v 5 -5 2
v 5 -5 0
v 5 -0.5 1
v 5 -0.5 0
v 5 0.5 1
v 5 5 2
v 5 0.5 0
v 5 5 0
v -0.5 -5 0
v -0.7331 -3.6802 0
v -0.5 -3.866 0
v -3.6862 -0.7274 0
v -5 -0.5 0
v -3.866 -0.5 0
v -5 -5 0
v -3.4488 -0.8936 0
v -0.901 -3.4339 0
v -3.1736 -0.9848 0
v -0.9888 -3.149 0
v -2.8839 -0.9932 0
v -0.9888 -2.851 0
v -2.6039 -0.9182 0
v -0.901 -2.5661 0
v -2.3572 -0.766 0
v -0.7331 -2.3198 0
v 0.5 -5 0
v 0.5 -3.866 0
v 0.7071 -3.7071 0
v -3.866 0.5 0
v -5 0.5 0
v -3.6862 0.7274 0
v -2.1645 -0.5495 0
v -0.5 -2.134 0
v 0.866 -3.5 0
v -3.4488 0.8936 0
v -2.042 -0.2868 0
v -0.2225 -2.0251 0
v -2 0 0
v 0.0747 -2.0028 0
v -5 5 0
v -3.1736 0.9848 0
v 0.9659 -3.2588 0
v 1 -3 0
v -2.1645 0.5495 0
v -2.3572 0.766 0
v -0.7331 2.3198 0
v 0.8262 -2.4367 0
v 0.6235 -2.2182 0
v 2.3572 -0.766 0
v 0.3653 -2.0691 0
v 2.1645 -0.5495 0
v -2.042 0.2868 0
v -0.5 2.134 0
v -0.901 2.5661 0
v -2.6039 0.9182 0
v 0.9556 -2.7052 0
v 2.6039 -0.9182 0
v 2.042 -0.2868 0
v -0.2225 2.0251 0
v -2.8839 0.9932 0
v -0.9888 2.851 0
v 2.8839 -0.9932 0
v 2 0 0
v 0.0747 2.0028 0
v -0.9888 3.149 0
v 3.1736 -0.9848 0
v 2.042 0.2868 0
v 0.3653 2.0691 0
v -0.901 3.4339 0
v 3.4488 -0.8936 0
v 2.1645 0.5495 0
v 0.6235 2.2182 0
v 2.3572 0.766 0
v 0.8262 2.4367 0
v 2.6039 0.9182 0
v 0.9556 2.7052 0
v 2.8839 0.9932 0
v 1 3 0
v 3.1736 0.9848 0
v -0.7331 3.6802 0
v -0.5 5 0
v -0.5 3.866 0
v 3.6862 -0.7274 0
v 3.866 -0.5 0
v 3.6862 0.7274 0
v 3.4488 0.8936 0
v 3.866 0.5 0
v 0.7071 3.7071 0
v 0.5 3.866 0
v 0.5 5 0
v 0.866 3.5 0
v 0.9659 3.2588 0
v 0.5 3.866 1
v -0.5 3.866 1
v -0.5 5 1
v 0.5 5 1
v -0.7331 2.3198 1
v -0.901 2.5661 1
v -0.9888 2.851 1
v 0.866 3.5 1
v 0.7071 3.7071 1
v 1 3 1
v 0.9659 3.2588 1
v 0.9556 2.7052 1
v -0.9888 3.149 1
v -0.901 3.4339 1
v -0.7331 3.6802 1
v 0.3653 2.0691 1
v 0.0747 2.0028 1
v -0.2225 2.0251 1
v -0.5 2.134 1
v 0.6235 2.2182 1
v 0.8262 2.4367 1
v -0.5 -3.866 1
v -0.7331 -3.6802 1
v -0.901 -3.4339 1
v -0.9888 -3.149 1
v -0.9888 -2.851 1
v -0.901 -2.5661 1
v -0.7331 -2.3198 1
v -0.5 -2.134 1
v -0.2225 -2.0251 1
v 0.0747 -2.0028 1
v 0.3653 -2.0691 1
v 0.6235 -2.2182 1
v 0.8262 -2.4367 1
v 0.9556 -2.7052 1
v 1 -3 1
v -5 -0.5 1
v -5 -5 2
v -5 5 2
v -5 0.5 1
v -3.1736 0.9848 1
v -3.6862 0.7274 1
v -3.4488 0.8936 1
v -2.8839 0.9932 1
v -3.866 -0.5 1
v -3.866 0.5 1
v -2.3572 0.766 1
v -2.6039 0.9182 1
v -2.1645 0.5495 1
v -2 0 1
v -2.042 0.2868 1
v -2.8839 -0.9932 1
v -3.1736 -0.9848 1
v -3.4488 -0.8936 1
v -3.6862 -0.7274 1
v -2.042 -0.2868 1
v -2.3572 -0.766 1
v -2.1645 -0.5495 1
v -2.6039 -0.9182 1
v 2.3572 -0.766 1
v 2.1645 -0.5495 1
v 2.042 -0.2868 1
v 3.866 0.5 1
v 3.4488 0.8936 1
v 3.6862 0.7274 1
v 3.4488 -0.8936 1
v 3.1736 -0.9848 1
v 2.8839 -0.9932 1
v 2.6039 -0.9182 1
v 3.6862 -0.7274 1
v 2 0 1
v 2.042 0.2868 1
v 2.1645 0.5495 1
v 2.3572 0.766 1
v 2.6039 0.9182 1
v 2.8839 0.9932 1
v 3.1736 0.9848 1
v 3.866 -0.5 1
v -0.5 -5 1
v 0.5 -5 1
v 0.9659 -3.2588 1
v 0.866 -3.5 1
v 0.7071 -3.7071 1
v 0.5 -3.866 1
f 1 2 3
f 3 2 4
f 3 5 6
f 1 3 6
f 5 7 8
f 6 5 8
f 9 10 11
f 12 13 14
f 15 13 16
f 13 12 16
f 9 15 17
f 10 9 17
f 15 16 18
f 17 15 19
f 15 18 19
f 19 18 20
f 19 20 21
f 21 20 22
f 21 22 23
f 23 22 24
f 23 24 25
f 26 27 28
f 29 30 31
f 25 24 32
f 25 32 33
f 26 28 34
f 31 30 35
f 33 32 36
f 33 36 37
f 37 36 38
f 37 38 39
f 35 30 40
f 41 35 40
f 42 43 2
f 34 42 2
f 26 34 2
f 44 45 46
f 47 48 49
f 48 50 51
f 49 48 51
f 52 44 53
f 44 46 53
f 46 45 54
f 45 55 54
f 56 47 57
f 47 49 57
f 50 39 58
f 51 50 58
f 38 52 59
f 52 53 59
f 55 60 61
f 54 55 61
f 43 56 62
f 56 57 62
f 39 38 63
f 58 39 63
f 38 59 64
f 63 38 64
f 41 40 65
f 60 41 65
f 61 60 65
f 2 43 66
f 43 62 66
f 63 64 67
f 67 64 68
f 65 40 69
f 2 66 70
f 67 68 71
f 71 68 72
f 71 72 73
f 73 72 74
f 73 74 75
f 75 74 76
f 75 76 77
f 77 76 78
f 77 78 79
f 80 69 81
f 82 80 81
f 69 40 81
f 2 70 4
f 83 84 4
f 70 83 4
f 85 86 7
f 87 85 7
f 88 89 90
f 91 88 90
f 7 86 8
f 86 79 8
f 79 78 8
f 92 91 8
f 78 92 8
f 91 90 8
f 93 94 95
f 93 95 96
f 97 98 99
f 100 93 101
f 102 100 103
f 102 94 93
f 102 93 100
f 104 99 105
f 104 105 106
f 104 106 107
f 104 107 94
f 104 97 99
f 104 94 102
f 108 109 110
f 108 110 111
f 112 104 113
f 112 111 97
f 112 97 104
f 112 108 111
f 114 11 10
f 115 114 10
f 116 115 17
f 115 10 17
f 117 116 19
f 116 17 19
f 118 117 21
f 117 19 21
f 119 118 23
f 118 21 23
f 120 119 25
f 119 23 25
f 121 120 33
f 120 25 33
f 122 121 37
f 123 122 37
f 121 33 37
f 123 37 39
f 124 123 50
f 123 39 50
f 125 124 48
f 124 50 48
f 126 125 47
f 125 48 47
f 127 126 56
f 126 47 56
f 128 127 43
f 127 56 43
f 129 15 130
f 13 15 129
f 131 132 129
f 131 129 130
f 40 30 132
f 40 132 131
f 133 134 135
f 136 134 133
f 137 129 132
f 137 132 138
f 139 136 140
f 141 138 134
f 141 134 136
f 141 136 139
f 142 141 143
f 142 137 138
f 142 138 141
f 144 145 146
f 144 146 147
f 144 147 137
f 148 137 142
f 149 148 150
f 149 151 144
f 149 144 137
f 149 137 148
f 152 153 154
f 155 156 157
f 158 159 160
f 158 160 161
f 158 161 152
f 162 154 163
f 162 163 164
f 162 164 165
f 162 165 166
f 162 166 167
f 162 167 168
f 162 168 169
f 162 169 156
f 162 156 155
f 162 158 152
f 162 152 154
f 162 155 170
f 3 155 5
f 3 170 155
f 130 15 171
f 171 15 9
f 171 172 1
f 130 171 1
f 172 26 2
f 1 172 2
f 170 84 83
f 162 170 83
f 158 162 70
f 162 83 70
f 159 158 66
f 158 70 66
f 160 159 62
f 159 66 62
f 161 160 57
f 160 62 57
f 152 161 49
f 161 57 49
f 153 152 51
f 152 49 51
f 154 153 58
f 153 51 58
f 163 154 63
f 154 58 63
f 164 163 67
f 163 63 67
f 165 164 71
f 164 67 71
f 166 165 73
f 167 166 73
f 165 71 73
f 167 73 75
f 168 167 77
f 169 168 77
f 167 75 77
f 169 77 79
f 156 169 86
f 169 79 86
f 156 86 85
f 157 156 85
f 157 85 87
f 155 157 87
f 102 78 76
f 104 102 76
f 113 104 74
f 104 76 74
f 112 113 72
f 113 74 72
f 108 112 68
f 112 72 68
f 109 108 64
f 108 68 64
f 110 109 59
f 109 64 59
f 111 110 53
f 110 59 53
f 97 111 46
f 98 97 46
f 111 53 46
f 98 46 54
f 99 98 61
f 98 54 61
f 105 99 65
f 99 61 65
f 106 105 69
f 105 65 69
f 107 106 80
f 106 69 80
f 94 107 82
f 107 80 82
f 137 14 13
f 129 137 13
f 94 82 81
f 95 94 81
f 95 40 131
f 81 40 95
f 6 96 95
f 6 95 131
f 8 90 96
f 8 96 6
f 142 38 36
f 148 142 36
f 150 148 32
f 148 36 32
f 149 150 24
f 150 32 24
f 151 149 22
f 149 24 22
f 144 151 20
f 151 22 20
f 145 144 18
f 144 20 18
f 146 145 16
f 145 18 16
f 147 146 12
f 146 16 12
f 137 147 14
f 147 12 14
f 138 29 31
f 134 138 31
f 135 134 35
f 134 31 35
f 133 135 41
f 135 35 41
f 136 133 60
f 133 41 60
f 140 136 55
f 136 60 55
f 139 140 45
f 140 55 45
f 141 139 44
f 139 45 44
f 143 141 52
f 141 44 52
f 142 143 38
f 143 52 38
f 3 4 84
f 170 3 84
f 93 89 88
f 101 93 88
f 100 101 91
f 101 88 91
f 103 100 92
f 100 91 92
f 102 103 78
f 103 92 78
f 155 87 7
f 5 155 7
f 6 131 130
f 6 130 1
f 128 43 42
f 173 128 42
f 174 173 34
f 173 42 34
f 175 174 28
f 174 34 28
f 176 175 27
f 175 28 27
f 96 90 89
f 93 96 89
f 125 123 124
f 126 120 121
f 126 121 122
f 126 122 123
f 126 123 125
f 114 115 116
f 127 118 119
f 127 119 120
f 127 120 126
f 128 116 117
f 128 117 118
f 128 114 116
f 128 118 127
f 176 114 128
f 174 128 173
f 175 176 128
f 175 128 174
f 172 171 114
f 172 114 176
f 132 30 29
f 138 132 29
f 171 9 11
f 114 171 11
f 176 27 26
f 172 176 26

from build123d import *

# Parameters (mm, degrees)
F0_W     = 10
F0_H     = 10
F1_DEPTH = 2
F3_DEPTH = 1


with BuildPart() as f1:
    # F0 (on Top) → F1 (new body)
    with BuildSketch(Plane.XY):
        Rectangle(F0_W, F0_H)
    extrude(amount=F1_DEPTH)

    # F2 (on face) → F3 (cut)
    with BuildSketch(Plane(origin=(0, 0, 0), x_dir=(1, 0, 0), z_dir=(0, 0, -1))):
        with BuildLine():
            ThreePointArc((-0.5, 3.8660254038), (-0.5, 2.1339745962), (1, 3))
            ThreePointArc((1, 3), (0.8660254038, 3.5), (0.5, 3.8660254038))
            Line((0.5, 3.8660254038), (0.5, 3))
            Line((0.5, 3), (-0.5, 3))
            Line((-0.5, 3), (-0.5, 3.8660254038))
        make_face()
        with BuildLine():
            Line((0.5, 3), (0.5, 3.8660254038))
            ThreePointArc((0.5, 3.8660254038), (0, 4), (-0.5, 3.8660254038))
            Line((-0.5, 3.8660254038), (-0.5, 3))
            Line((-0.5, 3), (0.5, 3))
        make_face()
        with BuildLine():
            ThreePointArc((-0.5, 3.8660254038), (0, 4), (0.5, 3.8660254038))
            Line((0.5, 3.8660254038), (0.5, 5))
            Line((0.5, 5), (-0.5, 5))
            Line((-0.5, 5), (-0.5, 3.8660254038))
        make_face()
        with BuildLine():
            ThreePointArc((3.8660254038, -0.5), (3.9659258263, -0.2588190451), (4, 0))
            ThreePointArc((4, 0), (3.9659258263, 0.2588190451), (3.8660254038, 0.5))
            Line((3.8660254038, 0.5), (3, 0.5))
            Line((3, 0.5), (3, -0.5))
            Line((3, -0.5), (3.8660254038, -0.5))
        make_face()
        with BuildLine():
            ThreePointArc((3.8660254038, 0.5), (3.9659258263, 0.2588190451), (4, 0))
            ThreePointArc((4, 0), (3.9659258263, -0.2588190451), (3.8660254038, -0.5))
            Line((3.8660254038, -0.5), (5, -0.5))
            Line((5, -0.5), (5, 0.5))
            Line((5, 0.5), (3.8660254038, 0.5))
        make_face()
        with BuildLine():
            Line((3, 0.5), (3.8660254038, 0.5))
            ThreePointArc((3.8660254038, 0.5), (2, 0), (3.8660254038, -0.5))
            Line((3.8660254038, -0.5), (3, -0.5))
            Line((3, -0.5), (3, 0.5))
        make_face()
        with BuildLine():
            ThreePointArc((0.5, -3.8660254038), (0.8660254038, -3.5), (1, -3))
            ThreePointArc((1, -3), (-0.5, -2.1339745962), (-0.5, -3.8660254038))
            Line((-0.5, -3.8660254038), (-0.5, -3))
            Line((-0.5, -3), (0.5, -3))
            Line((0.5, -3), (0.5, -3.8660254038))
        make_face()
        with BuildLine():
            Line((-0.5, -3), (-0.5, -3.8660254038))
            ThreePointArc((-0.5, -3.8660254038), (0, -4), (0.5, -3.8660254038))
            Line((0.5, -3.8660254038), (0.5, -3))
            Line((0.5, -3), (-0.5, -3))
        make_face()
        with BuildLine():
            ThreePointArc((0.5, -3.8660254038), (0, -4), (-0.5, -3.8660254038))
            Line((-0.5, -3.8660254038), (-0.5, -5))
            Line((-0.5, -5), (0.5, -5))
            Line((0.5, -5), (0.5, -3.8660254038))
        make_face()
        with BuildLine():
            ThreePointArc((-3.8660254038, -0.5), (-2.7411809549, -0.9659258263), (-2, 0))
            ThreePointArc((-2, 0), (-2.7411809549, 0.9659258263), (-3.8660254038, 0.5))
            Line((-3.8660254038, 0.5), (-3, 0.5))
            Line((-3, 0.5), (-3, -0.5))
            Line((-3, -0.5), (-3.8660254038, -0.5))
        make_face()
        with BuildLine():
            Line((-3, 0.5), (-3.8660254038, 0.5))
            ThreePointArc((-3.8660254038, 0.5), (-4, 0), (-3.8660254038, -0.5))
            Line((-3.8660254038, -0.5), (-3, -0.5))
            Line((-3, -0.5), (-3, 0.5))
        make_face()
        with BuildLine():
            ThreePointArc((-3.8660254038, -0.5), (-4, 0), (-3.8660254038, 0.5))
            Line((-3.8660254038, 0.5), (-5, 0.5))
            Line((-5, 0.5), (-5, -0.5))
            Line((-5, -0.5), (-3.8660254038, -0.5))
        make_face()
    extrude(amount=-F3_DEPTH, mode=Mode.SUBTRACT)


solid = f1.part
